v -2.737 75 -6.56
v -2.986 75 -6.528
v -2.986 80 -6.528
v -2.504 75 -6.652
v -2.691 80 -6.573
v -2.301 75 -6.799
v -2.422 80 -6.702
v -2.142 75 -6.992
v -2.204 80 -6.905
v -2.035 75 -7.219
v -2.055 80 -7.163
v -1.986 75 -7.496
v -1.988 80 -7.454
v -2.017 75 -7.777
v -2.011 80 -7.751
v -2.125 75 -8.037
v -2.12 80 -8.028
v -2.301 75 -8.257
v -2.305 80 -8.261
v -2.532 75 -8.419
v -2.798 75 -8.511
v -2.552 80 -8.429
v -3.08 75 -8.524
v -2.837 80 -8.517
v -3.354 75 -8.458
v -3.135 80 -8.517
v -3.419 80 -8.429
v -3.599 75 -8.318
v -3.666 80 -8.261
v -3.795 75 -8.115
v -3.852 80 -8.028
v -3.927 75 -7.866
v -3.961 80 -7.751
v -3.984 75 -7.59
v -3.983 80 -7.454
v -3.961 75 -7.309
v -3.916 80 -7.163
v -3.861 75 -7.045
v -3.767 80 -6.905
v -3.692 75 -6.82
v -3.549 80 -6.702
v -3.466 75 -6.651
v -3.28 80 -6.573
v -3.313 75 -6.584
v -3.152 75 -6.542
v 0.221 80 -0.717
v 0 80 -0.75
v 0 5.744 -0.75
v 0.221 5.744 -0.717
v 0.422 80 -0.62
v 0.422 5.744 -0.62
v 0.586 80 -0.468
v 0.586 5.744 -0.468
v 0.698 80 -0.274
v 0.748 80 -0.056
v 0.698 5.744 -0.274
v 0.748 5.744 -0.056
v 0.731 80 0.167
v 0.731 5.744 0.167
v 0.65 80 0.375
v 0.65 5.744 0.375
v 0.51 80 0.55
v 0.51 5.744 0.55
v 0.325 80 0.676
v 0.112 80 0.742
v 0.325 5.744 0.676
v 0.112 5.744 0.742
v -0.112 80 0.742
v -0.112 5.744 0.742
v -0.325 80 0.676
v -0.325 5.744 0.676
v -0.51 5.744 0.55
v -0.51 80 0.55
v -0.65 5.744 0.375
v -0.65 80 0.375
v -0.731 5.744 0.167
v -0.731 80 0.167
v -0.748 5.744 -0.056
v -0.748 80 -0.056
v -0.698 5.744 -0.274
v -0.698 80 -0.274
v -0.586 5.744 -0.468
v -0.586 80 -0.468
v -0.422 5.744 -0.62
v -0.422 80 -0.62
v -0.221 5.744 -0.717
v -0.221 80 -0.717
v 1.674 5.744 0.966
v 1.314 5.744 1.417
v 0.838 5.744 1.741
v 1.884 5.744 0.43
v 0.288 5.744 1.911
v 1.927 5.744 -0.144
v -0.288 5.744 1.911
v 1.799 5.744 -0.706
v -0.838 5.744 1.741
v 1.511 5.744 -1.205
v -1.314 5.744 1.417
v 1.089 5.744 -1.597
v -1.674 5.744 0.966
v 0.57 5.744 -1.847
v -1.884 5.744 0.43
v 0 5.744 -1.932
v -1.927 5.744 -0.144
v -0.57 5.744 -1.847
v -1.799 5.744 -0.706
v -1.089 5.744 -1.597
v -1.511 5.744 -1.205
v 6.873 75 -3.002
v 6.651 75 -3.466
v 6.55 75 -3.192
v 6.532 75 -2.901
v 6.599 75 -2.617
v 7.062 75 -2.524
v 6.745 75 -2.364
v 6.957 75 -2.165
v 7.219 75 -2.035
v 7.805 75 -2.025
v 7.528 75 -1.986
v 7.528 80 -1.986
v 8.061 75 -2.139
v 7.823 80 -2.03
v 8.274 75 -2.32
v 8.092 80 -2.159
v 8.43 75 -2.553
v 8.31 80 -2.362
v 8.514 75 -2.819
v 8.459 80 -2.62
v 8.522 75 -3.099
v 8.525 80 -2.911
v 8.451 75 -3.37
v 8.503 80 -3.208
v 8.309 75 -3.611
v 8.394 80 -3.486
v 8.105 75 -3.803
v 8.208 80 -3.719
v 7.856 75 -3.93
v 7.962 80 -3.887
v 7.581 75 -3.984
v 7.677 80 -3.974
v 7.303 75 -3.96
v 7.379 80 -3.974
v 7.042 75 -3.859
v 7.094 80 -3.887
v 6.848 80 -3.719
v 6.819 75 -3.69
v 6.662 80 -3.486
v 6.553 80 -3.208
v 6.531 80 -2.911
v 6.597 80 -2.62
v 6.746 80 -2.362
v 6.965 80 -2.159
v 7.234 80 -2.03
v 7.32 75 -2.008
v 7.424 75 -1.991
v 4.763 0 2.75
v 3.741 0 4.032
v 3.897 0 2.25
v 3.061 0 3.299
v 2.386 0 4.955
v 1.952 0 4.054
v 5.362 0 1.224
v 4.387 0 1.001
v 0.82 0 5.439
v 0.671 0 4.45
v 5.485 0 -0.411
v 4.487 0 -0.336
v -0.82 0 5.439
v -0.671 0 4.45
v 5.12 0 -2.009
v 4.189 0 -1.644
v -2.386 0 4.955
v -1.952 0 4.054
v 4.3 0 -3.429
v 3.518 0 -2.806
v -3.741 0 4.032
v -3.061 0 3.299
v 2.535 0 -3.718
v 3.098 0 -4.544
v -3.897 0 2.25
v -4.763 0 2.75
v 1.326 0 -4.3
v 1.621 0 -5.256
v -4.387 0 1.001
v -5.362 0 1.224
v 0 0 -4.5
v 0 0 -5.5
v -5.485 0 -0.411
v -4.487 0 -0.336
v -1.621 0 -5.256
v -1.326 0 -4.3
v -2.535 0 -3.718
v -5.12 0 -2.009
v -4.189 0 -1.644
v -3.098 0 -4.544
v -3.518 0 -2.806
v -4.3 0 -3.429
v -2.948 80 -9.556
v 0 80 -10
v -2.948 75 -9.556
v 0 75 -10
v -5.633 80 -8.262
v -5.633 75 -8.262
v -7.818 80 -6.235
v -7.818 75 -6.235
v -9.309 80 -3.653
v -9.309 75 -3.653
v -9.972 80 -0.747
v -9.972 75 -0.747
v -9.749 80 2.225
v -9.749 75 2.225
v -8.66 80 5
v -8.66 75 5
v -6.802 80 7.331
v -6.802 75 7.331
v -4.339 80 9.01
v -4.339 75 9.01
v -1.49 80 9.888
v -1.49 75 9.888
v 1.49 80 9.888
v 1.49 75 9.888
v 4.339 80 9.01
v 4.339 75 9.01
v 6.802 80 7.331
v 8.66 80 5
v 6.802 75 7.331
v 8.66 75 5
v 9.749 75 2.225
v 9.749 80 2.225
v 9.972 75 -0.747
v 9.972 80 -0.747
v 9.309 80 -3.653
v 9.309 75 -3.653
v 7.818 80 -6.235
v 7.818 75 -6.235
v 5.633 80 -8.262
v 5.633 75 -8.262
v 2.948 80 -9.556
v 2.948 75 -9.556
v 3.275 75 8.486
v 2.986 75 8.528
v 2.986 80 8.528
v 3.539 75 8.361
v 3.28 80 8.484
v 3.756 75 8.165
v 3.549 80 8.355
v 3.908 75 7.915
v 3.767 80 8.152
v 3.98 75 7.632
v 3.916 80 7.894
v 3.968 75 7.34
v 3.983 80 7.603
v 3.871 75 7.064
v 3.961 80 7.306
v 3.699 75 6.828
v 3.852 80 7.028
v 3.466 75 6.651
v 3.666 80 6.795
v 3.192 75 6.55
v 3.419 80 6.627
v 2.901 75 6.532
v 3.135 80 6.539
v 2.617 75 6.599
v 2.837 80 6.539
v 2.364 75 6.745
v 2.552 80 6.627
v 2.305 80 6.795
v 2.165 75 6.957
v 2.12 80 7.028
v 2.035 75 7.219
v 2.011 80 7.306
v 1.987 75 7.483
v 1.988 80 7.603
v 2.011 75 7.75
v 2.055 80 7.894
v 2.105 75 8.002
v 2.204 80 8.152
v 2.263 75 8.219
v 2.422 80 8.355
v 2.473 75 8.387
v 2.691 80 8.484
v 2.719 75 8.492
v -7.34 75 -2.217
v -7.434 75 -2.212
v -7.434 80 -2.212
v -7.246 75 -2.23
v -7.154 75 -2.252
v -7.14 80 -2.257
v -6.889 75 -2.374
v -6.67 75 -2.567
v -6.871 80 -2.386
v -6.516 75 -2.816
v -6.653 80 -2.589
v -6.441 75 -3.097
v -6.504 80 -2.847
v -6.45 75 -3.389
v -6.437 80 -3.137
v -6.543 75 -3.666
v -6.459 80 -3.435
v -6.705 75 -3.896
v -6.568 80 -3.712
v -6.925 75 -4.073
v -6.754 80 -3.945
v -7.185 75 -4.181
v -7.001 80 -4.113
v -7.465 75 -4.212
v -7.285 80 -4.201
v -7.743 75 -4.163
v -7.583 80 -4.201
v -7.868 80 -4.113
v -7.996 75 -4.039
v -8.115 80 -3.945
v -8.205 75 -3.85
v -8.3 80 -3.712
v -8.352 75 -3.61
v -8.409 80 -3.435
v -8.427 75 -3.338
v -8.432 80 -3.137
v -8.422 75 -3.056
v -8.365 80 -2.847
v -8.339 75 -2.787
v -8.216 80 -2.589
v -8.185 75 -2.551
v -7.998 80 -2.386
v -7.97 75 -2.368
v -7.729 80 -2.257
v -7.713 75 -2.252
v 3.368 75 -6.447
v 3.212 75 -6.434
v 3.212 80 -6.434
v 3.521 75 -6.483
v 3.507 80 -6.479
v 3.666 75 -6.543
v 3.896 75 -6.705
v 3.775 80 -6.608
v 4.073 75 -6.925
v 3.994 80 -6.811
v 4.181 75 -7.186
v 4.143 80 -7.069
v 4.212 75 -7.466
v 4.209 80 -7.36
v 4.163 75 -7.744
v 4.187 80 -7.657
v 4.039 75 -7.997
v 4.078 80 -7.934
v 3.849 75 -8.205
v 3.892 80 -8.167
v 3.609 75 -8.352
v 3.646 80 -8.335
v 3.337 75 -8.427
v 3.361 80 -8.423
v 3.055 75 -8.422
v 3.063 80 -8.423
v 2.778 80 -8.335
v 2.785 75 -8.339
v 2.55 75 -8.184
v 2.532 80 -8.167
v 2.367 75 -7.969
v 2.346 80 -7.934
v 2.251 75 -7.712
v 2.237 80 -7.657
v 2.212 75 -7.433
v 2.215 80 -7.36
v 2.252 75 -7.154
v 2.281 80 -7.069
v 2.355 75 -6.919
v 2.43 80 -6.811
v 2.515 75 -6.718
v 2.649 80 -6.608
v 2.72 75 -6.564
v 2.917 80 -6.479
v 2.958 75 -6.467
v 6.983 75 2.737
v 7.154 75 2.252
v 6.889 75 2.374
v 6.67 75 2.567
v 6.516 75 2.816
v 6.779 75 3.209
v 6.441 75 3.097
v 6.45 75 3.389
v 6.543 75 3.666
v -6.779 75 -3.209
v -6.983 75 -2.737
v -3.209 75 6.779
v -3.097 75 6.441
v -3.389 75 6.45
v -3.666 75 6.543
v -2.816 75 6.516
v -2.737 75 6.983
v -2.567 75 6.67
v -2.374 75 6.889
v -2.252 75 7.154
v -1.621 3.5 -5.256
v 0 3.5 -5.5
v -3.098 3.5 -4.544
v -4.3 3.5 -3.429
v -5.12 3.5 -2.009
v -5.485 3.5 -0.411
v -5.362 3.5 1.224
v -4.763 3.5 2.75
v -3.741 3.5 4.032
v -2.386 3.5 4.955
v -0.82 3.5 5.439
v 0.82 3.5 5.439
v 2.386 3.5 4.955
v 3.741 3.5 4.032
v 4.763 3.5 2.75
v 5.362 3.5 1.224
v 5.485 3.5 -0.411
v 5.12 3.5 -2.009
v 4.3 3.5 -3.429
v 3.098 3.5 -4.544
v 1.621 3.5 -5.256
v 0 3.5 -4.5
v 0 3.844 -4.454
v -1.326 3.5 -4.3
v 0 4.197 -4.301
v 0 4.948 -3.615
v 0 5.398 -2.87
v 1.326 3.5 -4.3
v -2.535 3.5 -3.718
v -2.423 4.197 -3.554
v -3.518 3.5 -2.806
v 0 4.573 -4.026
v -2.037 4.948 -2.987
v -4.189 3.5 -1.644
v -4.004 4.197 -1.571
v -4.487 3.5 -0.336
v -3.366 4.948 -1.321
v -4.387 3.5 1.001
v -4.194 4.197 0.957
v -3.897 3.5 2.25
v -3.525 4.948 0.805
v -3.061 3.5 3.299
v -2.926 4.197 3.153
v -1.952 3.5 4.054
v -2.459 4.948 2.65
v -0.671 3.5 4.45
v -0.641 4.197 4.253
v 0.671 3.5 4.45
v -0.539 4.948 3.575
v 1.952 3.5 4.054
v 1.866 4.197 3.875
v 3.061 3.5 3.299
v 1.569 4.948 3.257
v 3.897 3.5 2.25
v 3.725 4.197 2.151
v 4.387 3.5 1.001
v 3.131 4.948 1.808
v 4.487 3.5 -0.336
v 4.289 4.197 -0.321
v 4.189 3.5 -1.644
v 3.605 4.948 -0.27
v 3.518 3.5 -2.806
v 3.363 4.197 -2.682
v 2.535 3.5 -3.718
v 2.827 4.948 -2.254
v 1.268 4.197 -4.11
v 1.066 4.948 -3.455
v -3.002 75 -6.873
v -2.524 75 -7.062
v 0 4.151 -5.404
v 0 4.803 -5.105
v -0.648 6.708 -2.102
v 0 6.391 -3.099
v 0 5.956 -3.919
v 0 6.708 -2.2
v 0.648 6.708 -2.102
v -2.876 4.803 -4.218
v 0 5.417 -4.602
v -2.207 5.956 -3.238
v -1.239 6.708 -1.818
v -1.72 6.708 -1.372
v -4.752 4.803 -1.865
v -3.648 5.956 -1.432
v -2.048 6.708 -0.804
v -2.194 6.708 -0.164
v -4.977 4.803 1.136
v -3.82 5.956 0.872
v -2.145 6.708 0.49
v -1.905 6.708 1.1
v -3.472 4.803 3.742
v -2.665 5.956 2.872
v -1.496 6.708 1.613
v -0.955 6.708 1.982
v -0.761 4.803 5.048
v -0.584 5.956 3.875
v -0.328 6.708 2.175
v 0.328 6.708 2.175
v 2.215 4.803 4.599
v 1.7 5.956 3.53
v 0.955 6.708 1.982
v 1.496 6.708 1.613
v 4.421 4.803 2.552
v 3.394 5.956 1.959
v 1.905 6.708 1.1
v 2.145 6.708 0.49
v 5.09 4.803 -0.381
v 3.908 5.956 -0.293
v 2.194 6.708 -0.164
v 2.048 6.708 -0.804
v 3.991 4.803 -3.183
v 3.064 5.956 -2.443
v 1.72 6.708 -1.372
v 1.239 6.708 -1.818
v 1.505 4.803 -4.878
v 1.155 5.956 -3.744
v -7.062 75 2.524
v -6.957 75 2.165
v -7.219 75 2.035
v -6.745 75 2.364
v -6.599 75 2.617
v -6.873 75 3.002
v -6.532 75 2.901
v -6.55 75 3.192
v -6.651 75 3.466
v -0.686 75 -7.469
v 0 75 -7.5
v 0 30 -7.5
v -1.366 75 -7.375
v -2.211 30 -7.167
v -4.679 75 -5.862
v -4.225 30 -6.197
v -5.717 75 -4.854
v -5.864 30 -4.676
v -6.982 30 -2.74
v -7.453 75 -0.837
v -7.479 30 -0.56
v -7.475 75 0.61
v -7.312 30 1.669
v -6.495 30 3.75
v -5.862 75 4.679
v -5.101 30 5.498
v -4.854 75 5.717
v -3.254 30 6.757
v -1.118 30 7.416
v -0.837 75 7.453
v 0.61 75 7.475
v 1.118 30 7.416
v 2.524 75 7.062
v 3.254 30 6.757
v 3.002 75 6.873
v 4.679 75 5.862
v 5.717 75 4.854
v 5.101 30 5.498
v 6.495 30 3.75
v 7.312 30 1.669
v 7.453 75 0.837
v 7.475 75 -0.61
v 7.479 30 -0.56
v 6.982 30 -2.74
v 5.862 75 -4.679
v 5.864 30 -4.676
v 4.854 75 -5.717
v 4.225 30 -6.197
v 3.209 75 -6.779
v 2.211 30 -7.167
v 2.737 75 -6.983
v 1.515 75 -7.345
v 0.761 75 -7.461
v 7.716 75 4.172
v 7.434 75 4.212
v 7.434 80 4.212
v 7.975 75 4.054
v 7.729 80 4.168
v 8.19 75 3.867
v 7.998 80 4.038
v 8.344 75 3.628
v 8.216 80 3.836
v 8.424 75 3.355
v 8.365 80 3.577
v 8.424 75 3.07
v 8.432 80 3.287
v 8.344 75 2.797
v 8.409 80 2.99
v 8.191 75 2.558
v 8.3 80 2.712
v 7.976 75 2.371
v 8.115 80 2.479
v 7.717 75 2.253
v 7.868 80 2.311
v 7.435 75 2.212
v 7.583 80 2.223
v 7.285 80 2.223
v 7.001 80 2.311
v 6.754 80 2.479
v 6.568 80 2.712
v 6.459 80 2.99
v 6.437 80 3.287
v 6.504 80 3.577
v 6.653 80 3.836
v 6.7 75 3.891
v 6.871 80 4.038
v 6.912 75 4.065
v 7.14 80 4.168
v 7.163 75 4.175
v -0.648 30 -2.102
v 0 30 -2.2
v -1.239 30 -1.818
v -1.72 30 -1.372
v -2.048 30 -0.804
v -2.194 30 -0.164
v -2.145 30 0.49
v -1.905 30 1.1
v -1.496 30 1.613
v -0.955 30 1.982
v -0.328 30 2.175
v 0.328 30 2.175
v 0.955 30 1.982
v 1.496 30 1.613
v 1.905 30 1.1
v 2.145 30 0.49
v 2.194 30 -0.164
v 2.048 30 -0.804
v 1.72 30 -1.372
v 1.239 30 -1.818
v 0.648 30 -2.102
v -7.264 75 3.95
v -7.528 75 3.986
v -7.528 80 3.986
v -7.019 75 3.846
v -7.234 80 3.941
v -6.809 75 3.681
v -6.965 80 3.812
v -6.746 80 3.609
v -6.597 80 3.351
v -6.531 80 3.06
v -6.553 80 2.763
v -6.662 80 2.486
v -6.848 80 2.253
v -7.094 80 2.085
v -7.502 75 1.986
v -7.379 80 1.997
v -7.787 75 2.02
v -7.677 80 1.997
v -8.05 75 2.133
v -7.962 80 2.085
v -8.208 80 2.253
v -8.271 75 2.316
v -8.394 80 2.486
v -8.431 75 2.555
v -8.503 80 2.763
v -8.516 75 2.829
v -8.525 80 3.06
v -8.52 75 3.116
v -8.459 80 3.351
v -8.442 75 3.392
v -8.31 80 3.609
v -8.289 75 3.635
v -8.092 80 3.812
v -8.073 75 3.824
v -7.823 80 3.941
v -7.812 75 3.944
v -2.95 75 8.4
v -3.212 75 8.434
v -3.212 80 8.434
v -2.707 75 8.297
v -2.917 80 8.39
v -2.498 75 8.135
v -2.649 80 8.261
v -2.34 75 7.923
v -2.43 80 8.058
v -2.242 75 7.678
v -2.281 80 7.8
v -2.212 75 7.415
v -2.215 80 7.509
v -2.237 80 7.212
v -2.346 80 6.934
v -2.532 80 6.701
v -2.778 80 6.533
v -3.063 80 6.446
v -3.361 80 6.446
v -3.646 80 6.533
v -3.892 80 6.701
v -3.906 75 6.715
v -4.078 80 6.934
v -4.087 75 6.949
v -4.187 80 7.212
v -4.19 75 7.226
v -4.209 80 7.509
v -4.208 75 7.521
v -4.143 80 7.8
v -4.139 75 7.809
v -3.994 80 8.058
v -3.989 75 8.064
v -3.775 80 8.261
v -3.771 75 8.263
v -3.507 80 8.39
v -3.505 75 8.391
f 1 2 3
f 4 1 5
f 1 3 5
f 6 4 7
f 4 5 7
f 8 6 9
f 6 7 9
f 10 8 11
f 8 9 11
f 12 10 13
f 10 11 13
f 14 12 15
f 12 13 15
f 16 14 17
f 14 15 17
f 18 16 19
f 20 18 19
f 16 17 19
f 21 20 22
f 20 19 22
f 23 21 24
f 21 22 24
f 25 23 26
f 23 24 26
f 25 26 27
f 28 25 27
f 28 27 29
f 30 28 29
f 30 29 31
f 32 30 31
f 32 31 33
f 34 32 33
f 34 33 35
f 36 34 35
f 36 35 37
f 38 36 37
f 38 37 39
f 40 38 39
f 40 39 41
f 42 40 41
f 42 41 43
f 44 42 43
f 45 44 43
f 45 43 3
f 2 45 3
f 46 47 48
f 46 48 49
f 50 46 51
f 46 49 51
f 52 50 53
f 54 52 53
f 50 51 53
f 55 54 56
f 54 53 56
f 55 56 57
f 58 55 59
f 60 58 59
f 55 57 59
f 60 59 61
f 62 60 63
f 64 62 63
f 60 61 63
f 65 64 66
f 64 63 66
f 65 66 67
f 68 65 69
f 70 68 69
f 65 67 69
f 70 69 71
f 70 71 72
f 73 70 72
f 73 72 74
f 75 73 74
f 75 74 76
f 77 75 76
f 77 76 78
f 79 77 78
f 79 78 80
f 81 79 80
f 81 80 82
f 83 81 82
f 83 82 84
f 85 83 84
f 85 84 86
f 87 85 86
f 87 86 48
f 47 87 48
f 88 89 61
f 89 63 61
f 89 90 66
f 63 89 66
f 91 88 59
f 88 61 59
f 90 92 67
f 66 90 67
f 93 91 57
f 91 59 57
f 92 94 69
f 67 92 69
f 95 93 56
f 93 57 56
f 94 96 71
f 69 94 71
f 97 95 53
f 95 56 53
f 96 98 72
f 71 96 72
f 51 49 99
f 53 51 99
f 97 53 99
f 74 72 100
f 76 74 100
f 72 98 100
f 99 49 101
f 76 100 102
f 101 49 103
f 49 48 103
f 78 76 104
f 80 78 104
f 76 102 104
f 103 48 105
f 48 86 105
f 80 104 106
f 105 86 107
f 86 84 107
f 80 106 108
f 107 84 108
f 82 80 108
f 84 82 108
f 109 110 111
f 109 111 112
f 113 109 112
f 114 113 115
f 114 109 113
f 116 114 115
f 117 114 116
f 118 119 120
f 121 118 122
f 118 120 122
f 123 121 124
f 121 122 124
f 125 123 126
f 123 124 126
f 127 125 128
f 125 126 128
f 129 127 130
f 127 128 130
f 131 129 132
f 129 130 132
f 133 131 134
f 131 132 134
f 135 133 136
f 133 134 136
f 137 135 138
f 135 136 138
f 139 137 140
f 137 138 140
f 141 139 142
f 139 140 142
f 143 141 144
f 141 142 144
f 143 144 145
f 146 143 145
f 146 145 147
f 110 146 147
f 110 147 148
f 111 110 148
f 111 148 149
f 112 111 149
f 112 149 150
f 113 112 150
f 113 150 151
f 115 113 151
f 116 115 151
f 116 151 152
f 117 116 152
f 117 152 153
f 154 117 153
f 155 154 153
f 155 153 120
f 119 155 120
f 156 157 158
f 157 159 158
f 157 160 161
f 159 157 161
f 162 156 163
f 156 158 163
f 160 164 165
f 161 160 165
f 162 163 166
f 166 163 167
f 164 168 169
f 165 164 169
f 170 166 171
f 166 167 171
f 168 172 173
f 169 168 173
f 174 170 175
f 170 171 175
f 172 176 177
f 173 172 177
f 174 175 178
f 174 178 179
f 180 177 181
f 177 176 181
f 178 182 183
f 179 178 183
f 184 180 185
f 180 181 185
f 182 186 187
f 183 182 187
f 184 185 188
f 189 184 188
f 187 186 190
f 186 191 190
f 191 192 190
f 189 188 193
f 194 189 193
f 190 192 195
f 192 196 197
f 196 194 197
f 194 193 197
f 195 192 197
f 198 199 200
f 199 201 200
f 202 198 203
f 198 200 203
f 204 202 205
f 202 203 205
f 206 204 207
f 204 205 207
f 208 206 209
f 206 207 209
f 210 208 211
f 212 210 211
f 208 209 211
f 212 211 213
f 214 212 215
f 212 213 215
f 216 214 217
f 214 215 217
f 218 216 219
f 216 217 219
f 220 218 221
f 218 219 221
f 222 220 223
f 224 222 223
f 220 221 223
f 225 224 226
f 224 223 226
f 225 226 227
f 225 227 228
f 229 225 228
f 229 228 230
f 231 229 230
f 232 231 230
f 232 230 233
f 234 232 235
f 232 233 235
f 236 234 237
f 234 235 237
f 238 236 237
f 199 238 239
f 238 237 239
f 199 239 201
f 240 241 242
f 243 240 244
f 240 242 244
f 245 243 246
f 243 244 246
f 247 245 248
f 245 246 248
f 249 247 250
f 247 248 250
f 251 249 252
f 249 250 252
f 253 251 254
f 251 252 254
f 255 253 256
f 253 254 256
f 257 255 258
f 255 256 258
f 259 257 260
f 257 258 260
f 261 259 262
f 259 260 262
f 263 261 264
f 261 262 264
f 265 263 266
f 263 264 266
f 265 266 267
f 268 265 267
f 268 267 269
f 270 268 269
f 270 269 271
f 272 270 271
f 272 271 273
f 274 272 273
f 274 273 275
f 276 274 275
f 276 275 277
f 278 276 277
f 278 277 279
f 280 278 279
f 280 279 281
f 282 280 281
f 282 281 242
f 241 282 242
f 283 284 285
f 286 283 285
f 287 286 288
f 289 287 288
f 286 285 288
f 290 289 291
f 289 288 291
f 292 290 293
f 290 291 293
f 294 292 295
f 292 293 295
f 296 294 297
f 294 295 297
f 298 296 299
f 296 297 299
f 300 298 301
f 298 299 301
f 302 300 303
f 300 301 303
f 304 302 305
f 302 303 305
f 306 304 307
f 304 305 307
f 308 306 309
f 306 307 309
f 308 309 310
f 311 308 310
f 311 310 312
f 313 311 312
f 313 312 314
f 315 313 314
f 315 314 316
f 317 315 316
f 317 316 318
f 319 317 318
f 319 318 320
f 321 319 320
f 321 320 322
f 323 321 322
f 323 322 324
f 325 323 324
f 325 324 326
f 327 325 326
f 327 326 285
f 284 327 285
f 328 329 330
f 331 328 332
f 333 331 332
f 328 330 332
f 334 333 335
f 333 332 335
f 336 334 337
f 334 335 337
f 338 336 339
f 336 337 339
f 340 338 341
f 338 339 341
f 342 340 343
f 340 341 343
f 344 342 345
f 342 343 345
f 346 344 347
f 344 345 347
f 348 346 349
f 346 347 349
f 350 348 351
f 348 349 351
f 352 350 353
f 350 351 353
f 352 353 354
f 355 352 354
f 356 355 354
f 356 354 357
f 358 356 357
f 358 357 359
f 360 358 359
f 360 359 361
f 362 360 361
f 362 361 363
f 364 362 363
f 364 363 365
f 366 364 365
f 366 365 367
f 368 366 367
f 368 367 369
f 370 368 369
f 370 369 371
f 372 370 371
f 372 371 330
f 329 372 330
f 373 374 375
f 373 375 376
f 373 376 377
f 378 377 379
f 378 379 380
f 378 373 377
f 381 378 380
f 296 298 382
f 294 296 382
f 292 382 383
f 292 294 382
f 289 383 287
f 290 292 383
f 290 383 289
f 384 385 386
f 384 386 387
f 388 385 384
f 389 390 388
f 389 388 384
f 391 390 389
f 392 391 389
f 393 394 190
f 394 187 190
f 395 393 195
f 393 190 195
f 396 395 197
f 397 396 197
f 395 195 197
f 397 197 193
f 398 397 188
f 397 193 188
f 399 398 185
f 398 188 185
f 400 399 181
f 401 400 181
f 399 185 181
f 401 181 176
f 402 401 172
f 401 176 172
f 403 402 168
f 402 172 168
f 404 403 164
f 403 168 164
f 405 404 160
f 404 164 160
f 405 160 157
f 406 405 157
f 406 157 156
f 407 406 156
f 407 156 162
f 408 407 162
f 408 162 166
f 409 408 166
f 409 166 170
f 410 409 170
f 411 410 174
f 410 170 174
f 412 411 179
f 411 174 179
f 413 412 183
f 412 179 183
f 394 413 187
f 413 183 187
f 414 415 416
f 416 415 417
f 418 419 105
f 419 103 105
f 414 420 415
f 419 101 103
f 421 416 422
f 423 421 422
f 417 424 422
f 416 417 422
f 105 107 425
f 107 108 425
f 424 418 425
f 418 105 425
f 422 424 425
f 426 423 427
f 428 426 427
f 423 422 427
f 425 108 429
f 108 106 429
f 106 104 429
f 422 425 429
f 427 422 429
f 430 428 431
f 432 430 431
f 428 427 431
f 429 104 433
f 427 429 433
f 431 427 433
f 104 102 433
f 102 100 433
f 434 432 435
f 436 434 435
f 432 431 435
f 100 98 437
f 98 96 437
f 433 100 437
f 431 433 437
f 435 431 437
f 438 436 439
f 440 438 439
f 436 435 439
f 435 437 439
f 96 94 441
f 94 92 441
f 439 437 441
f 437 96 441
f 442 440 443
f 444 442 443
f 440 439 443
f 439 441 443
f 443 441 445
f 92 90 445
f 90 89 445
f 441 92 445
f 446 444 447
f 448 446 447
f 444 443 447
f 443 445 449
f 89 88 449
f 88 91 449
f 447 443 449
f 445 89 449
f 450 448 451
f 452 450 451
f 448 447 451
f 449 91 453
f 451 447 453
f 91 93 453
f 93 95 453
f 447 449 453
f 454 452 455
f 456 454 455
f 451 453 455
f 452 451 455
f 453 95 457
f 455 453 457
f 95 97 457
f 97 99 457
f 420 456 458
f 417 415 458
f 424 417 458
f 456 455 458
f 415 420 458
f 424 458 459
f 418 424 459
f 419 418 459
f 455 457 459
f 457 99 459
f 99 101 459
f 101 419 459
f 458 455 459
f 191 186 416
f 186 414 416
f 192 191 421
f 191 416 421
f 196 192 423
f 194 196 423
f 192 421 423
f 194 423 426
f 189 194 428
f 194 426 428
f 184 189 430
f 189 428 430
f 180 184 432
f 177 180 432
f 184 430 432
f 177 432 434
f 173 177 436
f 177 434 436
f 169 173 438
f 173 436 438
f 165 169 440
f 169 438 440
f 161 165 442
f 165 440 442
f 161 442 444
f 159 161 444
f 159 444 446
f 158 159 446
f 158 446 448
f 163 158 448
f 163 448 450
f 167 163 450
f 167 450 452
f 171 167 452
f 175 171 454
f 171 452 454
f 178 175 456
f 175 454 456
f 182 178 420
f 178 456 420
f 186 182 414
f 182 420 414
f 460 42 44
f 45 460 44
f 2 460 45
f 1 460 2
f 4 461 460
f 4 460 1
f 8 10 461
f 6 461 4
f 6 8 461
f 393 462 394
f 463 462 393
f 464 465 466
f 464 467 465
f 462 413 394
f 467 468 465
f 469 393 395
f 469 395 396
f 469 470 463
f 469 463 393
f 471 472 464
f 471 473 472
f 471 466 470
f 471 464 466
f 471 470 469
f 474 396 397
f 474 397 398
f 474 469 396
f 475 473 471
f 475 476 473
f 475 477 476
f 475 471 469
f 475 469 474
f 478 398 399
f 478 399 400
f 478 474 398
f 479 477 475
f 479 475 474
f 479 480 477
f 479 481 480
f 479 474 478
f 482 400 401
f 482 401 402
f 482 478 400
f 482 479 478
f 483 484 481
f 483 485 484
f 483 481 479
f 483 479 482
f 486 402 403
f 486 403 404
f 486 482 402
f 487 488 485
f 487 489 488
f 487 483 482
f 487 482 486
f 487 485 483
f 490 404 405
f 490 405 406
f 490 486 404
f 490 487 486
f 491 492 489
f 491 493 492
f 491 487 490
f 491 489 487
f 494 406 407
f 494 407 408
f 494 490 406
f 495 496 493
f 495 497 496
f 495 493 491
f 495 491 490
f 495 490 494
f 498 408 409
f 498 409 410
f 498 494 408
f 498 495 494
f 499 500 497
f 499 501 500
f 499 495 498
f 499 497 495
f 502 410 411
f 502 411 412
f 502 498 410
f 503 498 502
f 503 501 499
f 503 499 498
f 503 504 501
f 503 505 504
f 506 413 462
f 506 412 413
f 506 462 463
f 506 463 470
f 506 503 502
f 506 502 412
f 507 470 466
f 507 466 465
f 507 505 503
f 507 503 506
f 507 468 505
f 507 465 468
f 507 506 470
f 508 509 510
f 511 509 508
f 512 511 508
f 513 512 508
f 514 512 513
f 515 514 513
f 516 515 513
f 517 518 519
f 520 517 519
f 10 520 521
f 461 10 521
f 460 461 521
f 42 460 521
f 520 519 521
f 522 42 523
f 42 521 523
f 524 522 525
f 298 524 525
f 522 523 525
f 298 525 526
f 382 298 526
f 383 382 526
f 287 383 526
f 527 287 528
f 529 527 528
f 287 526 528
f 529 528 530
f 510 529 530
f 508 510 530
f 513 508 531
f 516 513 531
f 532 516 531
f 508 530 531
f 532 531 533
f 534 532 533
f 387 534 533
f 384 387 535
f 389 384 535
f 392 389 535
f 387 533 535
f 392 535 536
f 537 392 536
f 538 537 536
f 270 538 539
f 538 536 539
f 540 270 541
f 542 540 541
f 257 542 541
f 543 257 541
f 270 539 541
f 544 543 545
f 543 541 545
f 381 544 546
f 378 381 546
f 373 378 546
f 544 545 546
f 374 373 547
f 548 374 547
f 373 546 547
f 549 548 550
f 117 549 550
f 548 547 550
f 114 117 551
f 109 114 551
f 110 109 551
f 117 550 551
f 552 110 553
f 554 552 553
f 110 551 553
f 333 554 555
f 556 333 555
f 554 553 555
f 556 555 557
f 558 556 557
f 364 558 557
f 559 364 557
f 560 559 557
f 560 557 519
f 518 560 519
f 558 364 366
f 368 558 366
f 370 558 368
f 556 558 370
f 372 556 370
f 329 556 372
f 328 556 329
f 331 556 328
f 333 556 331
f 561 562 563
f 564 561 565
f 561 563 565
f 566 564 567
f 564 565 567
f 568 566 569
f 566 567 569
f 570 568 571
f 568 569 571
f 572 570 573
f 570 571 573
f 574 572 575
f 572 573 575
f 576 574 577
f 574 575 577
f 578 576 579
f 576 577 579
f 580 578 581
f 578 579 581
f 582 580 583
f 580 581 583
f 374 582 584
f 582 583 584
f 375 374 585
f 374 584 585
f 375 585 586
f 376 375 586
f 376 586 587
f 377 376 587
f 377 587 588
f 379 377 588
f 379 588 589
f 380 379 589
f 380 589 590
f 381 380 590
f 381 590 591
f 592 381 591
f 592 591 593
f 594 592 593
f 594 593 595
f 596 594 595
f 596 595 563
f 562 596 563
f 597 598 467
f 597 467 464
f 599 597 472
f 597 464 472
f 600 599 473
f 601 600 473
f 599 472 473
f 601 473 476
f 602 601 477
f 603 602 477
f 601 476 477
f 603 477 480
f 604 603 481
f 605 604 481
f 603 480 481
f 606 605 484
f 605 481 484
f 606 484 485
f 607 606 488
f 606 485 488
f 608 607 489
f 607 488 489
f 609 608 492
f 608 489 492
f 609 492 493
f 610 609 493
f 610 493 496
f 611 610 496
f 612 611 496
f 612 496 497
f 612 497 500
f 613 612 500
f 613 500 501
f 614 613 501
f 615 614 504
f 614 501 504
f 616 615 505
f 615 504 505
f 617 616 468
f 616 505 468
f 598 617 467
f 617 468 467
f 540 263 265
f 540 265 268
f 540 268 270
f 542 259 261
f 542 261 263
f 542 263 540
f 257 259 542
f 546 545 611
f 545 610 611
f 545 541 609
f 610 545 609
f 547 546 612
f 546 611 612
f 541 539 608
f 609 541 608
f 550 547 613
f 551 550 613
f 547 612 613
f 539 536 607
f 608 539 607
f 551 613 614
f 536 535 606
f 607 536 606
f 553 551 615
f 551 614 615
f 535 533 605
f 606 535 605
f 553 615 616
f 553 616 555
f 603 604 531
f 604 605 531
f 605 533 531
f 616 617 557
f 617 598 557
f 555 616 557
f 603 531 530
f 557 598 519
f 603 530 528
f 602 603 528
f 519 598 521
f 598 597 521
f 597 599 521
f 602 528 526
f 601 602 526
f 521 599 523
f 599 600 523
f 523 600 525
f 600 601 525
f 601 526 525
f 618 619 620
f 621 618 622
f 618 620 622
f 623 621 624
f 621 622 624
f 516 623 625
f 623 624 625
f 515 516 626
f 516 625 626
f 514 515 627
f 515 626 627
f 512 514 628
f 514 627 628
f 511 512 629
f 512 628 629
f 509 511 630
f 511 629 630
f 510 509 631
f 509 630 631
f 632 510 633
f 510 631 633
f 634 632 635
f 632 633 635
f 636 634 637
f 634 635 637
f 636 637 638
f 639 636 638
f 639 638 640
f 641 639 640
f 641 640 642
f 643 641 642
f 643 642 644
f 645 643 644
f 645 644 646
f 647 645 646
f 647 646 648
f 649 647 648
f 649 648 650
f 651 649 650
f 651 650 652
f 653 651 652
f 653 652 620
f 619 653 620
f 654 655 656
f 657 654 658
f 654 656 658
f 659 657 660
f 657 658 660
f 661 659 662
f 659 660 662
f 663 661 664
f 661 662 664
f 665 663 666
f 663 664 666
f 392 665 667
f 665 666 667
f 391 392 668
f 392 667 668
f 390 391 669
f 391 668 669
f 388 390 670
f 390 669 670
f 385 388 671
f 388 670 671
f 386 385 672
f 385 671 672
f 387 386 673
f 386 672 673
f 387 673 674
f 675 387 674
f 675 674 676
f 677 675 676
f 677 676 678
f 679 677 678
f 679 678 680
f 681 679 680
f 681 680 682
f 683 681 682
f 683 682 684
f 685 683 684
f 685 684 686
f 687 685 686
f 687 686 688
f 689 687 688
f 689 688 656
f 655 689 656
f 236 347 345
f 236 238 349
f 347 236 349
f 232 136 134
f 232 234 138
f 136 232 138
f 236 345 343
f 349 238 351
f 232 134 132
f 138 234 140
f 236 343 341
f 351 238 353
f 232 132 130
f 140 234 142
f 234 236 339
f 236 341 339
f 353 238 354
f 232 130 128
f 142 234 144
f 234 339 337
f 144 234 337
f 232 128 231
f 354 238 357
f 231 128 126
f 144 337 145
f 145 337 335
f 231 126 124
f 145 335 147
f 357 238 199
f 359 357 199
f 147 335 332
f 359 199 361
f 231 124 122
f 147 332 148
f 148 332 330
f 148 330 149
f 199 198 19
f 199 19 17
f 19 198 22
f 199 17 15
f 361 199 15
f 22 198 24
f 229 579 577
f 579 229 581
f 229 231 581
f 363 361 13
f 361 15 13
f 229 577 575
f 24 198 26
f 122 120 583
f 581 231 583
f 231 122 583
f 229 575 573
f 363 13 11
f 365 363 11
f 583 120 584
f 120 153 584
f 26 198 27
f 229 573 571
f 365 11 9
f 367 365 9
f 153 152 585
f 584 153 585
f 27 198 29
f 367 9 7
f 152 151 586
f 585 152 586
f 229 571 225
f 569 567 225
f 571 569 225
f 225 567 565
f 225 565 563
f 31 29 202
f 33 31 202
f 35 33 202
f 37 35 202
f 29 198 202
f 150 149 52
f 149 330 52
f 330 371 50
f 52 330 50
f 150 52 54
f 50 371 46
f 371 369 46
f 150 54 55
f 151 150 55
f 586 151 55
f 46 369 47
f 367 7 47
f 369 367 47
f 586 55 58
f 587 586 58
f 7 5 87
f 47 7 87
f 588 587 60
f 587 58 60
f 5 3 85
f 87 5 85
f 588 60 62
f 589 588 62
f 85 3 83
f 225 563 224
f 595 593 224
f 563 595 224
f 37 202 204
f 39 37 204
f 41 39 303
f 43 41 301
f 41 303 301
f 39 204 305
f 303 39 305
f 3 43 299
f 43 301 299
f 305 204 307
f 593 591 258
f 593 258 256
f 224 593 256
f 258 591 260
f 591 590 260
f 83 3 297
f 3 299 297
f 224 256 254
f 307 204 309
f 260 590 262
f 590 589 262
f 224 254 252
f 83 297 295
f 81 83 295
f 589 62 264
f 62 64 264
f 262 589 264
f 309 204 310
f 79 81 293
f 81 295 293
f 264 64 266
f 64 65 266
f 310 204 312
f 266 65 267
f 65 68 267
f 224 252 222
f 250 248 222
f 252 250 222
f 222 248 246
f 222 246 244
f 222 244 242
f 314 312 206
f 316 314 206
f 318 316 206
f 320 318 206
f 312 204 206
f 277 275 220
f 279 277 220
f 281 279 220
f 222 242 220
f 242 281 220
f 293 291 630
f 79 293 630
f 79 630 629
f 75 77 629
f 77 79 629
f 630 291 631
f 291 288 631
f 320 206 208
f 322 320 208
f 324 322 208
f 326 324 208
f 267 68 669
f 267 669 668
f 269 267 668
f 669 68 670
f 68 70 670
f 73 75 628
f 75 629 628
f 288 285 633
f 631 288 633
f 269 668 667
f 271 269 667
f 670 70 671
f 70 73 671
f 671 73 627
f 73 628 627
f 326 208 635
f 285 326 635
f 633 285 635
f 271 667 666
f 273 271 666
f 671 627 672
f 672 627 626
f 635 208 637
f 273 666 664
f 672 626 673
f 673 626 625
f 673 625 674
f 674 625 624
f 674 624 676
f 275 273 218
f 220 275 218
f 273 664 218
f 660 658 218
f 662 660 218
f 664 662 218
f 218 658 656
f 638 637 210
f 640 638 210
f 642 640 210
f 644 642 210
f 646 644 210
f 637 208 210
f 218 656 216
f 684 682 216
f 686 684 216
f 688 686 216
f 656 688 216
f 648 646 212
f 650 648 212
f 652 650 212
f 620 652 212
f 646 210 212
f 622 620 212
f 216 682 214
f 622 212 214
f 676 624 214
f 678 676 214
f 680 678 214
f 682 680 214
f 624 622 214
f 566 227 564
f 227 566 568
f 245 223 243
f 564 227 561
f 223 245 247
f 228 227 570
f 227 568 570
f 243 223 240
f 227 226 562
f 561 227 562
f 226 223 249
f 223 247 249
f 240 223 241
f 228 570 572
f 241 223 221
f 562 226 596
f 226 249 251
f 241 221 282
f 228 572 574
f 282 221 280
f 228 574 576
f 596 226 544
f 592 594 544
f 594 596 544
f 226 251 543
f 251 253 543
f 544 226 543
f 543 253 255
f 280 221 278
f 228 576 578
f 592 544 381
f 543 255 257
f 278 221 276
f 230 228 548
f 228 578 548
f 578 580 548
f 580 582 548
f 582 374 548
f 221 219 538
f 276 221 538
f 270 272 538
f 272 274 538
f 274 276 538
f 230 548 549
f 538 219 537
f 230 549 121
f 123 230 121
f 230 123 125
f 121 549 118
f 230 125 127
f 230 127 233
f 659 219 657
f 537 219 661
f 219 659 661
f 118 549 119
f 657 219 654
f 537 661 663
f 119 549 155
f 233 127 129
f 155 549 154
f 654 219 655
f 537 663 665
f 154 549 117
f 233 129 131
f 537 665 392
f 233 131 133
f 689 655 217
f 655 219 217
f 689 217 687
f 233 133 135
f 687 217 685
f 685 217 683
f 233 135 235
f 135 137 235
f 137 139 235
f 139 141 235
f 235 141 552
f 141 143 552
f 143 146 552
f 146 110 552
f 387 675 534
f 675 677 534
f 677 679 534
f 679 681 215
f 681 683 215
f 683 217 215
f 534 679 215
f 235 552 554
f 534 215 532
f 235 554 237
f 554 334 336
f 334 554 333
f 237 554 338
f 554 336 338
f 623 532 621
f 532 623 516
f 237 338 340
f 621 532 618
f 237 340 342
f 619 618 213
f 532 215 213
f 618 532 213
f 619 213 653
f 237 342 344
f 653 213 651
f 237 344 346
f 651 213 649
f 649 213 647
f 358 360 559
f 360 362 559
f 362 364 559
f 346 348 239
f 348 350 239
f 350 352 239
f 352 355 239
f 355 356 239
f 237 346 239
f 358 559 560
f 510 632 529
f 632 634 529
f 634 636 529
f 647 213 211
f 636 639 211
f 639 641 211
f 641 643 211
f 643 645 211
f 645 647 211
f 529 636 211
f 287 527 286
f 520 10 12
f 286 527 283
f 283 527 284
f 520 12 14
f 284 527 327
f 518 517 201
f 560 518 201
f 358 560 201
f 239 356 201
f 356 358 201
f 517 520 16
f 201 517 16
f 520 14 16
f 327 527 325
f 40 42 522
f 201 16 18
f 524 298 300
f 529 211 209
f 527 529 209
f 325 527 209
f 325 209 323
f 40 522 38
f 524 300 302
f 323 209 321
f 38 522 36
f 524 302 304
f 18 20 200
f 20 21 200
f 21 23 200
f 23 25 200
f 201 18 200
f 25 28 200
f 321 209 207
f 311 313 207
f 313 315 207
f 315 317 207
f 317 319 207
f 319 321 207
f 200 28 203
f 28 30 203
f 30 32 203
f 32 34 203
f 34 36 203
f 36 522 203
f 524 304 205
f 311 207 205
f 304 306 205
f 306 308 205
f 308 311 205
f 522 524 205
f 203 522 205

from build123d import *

# Parameters (mm, degrees)
SKETCH3_R          = 0.75
CUT_EXTRUDE1_DEPTH = 75
SKETCH4_R          = 1
CUT_EXTRUDE2_DEPTH = 5


with BuildPart() as part:
    # Sketch1 → Revolve1 (revolve)
    with BuildSketch(Plane(origin=(0, 0, 0), x_dir=(0, 0, -1), z_dir=(1, 0, 0))):
        with BuildLine():
            Line((0, 80), (10, 80))
            Line((10, 80), (10, 75))
            Line((10, 75), (7.5, 75))
            Line((7.5, 75), (7.5, 30))
            Line((7.5, 30), (2.2, 30))
            Line((2.2, 30), (2.2, 6.707802986))
            add(Edge.make_bspline(
                [(5.5, 3.5), (5.5, 5.791287847), (2.2, 6.707802986)],
                knots=[3.141592654, 3.141592654, 3.141592654, 4.300872134, 4.300872134, 4.300872134], degree=2, weights=[1, 0.836660027, 1]))
            Line((5.5, 3.5), (5.5, 0))
            Line((5.5, 0), (4.5, 0))
            Line((4.5, 0), (4.5, 1))
            Line((4.5, 1), (4.5, 3.5))
            add(Edge.make_bspline(
                [(4.5, 3.5), (4.5, 3.697156866), (4.420178962, 4.058188281), (3.970108568, 4.705926092), (3.267562051, 5.215959335), (2.550576032, 5.549361773), (2.137087255, 5.687424721), (1.93239721, 5.744273668)],
                knots=[3.141592654, 3.141592654, 3.141592654, 3.141592654, 3.431412524, 3.721232394, 4.011052264, 4.155962199, 4.300872134, 4.300872134, 4.300872134, 4.300872134], degree=3))
            Line((1.93239721, 5.744273668), (0, 5.744273668))
            Line((0, 5.744273668), (0, 80))
        make_face()
    revolve(axis=Axis((0, 5.744273668, 0), (0, 1, 0)))

    # Sketch3 → Cut-Extrude1 (cut)
    with BuildSketch(Plane.XZ.offset(-5.744273668)):
        with Locations(Location((0, 0, 0), (0, 0, 270))):
            Circle(SKETCH3_R)
    extrude(amount=-CUT_EXTRUDE1_DEPTH, mode=Mode.SUBTRACT)

    # Sketch4 → Cut-Extrude2 (cut)
    with BuildSketch(Plane(origin=(0, 80, 0), x_dir=(1, 0, 0), z_dir=(0, 1, 0))):
        with Locations(Location((-2.985595387, 7.528271622, 0), (0, 0, 270))):
            Circle(SKETCH4_R)
        with Locations(Location((3.212157171, 7.434426659, 0), (0, 0, 270))):
            Circle(SKETCH4_R)
        with Locations(Location((7.528271622, 2.985595387, 0), (0, 0, 270))):
            Circle(SKETCH4_R)
        with Locations(Location((7.434426659, -3.212157171, 0), (0, 0, 270))):
            Circle(SKETCH4_R)
        with Locations(Location((2.985595387, -7.528271622, 0), (0, 0, 270))):
            Circle(SKETCH4_R)
        with Locations(Location((-3.212157171, -7.434426659, 0), (0, 0, 270))):
            Circle(SKETCH4_R)
        with Locations(Location((-7.528271622, -2.985595387, 0), (0, 0, 270))):
            Circle(SKETCH4_R)
        with Locations(Location((-7.434426659, 3.212157171, 0), (0, 0, 270))):
            Circle(SKETCH4_R)
    extrude(amount=-CUT_EXTRUDE2_DEPTH, mode=Mode.SUBTRACT)


solid = part.part
